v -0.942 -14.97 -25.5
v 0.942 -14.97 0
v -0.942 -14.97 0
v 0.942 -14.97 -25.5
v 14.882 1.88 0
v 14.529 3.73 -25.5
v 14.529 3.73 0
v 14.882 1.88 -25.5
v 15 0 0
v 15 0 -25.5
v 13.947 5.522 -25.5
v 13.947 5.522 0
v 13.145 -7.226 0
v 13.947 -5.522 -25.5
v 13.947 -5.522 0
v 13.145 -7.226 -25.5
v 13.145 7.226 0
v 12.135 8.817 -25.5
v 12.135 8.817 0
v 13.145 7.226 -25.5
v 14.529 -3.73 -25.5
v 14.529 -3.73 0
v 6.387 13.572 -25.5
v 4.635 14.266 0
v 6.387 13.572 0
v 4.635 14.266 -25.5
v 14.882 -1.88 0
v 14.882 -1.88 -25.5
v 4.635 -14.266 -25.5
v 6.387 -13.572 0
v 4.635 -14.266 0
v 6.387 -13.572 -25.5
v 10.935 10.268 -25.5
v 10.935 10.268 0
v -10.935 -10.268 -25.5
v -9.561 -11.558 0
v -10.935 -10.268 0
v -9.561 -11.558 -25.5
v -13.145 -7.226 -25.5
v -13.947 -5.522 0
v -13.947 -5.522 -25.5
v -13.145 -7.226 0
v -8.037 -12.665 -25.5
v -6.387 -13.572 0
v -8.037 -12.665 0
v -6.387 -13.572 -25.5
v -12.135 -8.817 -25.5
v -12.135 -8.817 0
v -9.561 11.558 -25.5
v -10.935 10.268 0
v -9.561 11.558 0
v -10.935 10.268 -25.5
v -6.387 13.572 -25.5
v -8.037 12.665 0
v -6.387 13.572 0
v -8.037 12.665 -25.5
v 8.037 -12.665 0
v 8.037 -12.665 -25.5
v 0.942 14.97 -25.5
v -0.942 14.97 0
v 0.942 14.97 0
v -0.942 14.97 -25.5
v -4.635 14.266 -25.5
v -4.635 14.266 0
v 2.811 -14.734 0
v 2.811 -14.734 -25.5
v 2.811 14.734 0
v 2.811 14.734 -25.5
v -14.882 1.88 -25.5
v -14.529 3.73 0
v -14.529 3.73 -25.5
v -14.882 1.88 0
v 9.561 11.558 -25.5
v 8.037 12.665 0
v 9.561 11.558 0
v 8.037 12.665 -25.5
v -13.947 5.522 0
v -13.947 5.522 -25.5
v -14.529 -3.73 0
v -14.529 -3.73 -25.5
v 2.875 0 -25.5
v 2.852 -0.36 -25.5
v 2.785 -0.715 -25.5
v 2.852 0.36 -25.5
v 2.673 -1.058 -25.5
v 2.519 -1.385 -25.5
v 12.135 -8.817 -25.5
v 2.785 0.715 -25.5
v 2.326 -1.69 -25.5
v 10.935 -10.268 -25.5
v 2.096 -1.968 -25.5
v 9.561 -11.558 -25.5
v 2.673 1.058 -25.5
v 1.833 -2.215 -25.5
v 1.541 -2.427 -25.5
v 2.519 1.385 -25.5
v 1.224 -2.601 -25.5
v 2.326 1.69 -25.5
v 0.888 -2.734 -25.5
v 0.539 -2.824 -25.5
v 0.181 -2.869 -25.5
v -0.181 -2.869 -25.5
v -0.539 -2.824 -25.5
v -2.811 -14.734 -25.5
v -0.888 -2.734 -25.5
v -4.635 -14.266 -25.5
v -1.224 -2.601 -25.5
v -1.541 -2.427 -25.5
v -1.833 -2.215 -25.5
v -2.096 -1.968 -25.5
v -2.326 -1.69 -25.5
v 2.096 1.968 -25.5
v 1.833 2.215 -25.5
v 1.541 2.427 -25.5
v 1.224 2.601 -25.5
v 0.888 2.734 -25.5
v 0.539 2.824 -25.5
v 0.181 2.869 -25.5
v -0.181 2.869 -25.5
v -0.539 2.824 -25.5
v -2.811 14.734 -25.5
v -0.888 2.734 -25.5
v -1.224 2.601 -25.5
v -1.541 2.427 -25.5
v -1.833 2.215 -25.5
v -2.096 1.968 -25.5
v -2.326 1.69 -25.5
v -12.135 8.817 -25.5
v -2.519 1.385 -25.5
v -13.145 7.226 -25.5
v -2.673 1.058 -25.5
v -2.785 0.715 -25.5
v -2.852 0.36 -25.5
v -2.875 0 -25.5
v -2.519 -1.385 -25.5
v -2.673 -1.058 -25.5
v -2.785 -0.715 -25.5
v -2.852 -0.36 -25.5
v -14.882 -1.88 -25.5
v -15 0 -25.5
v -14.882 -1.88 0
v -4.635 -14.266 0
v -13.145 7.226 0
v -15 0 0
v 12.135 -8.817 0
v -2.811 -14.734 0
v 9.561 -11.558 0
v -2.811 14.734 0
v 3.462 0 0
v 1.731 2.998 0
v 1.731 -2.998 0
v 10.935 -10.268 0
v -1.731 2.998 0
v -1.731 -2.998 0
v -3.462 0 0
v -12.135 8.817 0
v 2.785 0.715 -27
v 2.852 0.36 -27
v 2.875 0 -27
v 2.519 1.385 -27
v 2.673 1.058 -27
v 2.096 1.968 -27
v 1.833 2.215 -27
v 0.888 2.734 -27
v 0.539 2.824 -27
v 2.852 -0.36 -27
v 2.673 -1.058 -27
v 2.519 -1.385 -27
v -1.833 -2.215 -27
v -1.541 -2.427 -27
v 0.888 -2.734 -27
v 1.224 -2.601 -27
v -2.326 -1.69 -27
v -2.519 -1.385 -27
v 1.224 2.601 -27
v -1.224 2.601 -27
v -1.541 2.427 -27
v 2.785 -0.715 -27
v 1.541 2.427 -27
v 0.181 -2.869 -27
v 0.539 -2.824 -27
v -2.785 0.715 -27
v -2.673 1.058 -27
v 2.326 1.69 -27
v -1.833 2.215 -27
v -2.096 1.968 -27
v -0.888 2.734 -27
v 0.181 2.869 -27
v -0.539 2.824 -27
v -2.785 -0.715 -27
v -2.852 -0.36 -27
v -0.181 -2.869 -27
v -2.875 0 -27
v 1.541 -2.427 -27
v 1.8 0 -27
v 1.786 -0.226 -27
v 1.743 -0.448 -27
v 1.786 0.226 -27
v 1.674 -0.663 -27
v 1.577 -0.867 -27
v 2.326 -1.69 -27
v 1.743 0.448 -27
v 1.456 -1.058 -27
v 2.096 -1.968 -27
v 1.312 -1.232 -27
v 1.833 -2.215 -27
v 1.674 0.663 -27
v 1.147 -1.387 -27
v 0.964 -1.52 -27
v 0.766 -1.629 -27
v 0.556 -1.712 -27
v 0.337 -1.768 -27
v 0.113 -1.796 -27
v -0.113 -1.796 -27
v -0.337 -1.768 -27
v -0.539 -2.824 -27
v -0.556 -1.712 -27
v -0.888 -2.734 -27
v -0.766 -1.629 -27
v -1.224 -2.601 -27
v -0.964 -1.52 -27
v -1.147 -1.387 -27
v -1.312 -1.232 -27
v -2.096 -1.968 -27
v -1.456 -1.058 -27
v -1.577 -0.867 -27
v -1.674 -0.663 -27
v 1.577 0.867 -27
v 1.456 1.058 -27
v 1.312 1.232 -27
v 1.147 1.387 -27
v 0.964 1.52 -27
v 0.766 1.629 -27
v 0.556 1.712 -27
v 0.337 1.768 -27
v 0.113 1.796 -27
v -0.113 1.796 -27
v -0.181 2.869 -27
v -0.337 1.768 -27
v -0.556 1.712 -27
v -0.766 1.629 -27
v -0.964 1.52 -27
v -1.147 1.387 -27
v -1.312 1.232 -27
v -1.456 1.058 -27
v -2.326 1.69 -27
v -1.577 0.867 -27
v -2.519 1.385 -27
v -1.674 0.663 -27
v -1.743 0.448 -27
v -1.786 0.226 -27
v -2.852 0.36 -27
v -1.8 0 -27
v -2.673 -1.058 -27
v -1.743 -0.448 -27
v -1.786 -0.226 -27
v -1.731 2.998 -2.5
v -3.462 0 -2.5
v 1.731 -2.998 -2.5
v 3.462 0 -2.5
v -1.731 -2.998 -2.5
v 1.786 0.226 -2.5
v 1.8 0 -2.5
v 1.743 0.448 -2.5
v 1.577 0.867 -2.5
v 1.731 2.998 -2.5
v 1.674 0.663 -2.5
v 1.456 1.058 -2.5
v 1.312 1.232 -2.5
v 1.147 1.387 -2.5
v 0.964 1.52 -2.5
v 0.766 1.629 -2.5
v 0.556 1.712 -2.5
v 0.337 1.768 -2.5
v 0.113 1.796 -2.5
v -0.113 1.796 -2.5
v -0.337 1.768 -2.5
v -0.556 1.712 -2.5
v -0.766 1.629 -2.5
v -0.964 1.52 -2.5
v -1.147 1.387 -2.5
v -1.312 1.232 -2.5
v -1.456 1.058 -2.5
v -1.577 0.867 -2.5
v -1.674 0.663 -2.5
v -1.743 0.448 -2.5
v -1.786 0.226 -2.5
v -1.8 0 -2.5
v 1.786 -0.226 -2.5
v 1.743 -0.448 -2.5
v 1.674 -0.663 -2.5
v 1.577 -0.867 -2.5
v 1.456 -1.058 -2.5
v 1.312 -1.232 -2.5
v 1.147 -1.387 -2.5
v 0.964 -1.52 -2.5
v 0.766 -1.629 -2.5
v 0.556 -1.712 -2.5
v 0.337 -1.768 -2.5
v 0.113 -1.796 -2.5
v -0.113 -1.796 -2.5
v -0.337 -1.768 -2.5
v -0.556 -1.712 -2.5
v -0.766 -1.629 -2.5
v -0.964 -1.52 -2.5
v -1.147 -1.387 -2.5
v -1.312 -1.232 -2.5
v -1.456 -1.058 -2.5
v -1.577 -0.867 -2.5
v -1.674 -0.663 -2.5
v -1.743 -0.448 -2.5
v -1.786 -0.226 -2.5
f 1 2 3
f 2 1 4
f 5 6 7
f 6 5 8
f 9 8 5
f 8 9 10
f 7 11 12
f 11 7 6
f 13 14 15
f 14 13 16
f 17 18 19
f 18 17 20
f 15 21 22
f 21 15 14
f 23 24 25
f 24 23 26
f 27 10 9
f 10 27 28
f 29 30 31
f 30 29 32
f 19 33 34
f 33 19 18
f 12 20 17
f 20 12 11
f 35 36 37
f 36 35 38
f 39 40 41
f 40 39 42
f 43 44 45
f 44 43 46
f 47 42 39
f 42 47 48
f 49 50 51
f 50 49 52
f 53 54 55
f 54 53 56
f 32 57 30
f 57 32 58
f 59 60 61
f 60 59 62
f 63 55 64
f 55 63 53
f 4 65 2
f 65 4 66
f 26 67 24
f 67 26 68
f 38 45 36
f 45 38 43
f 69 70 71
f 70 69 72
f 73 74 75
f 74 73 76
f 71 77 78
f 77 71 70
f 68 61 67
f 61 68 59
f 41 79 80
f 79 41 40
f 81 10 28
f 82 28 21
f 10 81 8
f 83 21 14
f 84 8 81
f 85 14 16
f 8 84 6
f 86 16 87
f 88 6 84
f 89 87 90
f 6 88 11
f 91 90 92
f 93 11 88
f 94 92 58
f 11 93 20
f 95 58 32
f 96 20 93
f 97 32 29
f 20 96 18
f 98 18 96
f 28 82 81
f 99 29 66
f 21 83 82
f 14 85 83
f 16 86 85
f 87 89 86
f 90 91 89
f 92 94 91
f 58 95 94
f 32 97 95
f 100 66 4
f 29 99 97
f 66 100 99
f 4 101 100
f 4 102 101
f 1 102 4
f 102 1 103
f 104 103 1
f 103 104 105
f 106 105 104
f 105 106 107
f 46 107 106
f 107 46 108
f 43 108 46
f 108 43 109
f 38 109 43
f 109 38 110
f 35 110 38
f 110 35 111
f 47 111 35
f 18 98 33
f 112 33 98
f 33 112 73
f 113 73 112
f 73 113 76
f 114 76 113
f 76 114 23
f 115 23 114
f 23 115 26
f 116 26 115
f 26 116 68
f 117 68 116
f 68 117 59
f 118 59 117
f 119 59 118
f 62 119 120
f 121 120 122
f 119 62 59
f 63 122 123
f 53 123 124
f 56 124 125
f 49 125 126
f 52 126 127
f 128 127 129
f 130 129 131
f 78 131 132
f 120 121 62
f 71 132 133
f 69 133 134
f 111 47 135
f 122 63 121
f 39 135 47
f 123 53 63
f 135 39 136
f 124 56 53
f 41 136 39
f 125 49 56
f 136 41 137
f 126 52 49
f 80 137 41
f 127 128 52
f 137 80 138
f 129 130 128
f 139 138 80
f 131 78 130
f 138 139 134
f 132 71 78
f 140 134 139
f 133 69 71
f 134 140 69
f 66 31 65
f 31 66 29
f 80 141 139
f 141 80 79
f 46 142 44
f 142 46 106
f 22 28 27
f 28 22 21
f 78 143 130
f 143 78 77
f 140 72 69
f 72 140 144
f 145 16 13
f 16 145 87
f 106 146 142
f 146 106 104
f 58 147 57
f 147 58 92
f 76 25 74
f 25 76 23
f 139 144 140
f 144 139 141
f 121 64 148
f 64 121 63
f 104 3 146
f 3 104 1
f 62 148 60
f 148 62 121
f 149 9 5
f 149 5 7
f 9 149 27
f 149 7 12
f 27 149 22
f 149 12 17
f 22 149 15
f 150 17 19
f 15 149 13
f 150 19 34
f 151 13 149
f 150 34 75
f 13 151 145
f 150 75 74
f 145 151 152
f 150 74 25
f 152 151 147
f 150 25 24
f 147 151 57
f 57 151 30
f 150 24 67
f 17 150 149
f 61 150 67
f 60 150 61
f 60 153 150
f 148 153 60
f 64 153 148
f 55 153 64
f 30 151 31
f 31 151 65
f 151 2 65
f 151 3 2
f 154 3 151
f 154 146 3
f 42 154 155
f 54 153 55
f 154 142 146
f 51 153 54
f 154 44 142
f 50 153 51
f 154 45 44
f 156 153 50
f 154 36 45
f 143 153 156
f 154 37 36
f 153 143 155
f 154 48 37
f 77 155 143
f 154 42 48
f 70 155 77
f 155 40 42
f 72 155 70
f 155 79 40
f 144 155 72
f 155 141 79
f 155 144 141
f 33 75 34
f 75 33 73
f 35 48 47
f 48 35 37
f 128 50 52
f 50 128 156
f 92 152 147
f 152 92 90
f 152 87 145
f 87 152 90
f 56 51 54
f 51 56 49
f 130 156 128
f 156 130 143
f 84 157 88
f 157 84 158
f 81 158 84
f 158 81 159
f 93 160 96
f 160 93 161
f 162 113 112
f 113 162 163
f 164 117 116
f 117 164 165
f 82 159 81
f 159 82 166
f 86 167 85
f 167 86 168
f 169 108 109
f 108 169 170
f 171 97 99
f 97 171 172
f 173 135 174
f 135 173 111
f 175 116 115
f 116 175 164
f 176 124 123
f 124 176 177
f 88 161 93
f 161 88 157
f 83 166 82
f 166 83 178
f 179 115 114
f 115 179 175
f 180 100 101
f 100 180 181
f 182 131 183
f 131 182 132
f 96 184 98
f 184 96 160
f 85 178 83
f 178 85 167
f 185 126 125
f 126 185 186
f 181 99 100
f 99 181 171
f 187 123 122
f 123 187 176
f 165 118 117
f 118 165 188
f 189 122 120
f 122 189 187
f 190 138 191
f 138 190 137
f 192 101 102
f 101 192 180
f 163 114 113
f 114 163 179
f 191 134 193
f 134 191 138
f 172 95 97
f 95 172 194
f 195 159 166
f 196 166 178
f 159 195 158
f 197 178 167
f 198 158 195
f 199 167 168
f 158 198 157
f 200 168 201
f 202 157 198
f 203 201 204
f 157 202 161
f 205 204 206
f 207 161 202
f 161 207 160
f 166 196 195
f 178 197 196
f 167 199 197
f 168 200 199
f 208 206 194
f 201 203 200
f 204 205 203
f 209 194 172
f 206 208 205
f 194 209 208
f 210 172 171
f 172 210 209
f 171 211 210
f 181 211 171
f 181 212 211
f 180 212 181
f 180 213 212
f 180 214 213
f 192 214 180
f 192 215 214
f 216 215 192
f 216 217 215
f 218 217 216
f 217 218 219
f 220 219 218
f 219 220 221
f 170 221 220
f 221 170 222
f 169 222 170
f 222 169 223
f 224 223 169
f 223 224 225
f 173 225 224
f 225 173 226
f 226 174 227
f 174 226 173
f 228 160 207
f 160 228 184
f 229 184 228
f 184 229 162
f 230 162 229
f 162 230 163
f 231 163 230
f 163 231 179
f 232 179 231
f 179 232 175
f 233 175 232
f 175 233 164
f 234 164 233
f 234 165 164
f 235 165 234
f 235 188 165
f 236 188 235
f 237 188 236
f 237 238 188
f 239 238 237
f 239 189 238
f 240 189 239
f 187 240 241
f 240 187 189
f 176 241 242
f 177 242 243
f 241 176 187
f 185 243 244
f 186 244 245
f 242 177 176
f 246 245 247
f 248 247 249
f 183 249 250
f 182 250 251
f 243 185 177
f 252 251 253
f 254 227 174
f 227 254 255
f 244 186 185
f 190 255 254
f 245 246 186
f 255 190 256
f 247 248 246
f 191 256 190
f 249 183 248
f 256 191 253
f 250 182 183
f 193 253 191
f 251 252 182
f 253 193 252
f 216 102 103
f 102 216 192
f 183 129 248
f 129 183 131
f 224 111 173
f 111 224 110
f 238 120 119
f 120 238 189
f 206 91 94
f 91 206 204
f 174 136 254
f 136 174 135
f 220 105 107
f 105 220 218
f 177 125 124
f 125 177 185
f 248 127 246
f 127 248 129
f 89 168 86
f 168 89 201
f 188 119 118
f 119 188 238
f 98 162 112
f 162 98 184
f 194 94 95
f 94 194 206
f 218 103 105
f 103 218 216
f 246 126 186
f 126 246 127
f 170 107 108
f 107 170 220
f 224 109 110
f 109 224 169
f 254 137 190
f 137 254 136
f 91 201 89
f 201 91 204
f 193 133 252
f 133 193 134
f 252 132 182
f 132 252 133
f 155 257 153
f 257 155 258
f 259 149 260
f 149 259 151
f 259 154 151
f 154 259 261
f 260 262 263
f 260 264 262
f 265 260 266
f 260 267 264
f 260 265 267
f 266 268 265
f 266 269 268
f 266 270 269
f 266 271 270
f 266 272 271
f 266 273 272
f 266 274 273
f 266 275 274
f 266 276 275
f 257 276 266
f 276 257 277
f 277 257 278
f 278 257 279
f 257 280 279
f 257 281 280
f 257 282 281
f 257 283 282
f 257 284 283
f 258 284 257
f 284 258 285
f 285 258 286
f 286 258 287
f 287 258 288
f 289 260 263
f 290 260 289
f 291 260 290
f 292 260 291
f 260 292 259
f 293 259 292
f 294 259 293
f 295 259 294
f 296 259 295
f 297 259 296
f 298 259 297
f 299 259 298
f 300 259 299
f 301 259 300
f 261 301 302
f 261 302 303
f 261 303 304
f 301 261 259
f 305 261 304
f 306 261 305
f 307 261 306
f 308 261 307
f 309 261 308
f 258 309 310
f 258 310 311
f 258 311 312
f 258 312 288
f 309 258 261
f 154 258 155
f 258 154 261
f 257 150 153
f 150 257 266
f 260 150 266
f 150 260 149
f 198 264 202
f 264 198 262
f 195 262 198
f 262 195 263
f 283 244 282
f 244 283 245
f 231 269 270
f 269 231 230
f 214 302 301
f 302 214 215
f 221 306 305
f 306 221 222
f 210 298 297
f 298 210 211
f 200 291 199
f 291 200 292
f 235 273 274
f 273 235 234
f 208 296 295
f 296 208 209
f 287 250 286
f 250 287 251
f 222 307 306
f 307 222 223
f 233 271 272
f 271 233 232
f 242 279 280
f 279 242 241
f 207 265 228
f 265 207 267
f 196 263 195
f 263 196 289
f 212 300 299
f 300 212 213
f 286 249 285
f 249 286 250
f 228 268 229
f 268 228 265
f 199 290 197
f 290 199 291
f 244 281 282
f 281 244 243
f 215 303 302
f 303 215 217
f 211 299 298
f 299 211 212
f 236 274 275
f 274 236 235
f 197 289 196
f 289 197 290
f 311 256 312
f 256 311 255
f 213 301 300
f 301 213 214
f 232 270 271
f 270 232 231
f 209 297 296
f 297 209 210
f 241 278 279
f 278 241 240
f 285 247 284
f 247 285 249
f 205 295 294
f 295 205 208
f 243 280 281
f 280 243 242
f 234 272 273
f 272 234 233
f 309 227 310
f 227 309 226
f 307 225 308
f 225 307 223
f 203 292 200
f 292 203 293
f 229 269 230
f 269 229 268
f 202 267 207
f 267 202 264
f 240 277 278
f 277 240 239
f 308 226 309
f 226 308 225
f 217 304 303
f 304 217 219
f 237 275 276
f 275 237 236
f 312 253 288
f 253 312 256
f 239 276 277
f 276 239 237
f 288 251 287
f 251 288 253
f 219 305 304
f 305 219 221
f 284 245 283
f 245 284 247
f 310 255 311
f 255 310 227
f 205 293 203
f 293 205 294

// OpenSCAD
$fn = 50;


difference() {
	union() {
		translate(v = [0, 0, -25.5000000000]) {
			cylinder(h = 25.5000000000, r = 15.0000000000);
		}
		#translate(v = [0, 0, -27.0000000000]) {
			cylinder(h = 27, r = 2.8750000000);
		}
	}
	union() {
		translate(v = [0, 0, 0]) {
			rotate(a = [0, 0, 0]) {
				difference() {
					union() {
						translate(v = [0, 0, -2.5000000000]) {
							linear_extrude(height = 2.5000000000) {
								polygon(points = [[3.4620000000, 0.0000000000], [1.7310000000, 2.9981799479], [-1.7310000000, 2.9981799479], [-3.4620000000, 0.0000000000], [-1.7310000000, -2.9981799479], [1.7310000000, -2.9981799479]]);
							}
						}
					}
					union();
				}
			}
		}
		#translate(v = [0, 0, -100.0000000000]) {
			cylinder(h = 200, r = 1.8000000000);
		}
	}
}
